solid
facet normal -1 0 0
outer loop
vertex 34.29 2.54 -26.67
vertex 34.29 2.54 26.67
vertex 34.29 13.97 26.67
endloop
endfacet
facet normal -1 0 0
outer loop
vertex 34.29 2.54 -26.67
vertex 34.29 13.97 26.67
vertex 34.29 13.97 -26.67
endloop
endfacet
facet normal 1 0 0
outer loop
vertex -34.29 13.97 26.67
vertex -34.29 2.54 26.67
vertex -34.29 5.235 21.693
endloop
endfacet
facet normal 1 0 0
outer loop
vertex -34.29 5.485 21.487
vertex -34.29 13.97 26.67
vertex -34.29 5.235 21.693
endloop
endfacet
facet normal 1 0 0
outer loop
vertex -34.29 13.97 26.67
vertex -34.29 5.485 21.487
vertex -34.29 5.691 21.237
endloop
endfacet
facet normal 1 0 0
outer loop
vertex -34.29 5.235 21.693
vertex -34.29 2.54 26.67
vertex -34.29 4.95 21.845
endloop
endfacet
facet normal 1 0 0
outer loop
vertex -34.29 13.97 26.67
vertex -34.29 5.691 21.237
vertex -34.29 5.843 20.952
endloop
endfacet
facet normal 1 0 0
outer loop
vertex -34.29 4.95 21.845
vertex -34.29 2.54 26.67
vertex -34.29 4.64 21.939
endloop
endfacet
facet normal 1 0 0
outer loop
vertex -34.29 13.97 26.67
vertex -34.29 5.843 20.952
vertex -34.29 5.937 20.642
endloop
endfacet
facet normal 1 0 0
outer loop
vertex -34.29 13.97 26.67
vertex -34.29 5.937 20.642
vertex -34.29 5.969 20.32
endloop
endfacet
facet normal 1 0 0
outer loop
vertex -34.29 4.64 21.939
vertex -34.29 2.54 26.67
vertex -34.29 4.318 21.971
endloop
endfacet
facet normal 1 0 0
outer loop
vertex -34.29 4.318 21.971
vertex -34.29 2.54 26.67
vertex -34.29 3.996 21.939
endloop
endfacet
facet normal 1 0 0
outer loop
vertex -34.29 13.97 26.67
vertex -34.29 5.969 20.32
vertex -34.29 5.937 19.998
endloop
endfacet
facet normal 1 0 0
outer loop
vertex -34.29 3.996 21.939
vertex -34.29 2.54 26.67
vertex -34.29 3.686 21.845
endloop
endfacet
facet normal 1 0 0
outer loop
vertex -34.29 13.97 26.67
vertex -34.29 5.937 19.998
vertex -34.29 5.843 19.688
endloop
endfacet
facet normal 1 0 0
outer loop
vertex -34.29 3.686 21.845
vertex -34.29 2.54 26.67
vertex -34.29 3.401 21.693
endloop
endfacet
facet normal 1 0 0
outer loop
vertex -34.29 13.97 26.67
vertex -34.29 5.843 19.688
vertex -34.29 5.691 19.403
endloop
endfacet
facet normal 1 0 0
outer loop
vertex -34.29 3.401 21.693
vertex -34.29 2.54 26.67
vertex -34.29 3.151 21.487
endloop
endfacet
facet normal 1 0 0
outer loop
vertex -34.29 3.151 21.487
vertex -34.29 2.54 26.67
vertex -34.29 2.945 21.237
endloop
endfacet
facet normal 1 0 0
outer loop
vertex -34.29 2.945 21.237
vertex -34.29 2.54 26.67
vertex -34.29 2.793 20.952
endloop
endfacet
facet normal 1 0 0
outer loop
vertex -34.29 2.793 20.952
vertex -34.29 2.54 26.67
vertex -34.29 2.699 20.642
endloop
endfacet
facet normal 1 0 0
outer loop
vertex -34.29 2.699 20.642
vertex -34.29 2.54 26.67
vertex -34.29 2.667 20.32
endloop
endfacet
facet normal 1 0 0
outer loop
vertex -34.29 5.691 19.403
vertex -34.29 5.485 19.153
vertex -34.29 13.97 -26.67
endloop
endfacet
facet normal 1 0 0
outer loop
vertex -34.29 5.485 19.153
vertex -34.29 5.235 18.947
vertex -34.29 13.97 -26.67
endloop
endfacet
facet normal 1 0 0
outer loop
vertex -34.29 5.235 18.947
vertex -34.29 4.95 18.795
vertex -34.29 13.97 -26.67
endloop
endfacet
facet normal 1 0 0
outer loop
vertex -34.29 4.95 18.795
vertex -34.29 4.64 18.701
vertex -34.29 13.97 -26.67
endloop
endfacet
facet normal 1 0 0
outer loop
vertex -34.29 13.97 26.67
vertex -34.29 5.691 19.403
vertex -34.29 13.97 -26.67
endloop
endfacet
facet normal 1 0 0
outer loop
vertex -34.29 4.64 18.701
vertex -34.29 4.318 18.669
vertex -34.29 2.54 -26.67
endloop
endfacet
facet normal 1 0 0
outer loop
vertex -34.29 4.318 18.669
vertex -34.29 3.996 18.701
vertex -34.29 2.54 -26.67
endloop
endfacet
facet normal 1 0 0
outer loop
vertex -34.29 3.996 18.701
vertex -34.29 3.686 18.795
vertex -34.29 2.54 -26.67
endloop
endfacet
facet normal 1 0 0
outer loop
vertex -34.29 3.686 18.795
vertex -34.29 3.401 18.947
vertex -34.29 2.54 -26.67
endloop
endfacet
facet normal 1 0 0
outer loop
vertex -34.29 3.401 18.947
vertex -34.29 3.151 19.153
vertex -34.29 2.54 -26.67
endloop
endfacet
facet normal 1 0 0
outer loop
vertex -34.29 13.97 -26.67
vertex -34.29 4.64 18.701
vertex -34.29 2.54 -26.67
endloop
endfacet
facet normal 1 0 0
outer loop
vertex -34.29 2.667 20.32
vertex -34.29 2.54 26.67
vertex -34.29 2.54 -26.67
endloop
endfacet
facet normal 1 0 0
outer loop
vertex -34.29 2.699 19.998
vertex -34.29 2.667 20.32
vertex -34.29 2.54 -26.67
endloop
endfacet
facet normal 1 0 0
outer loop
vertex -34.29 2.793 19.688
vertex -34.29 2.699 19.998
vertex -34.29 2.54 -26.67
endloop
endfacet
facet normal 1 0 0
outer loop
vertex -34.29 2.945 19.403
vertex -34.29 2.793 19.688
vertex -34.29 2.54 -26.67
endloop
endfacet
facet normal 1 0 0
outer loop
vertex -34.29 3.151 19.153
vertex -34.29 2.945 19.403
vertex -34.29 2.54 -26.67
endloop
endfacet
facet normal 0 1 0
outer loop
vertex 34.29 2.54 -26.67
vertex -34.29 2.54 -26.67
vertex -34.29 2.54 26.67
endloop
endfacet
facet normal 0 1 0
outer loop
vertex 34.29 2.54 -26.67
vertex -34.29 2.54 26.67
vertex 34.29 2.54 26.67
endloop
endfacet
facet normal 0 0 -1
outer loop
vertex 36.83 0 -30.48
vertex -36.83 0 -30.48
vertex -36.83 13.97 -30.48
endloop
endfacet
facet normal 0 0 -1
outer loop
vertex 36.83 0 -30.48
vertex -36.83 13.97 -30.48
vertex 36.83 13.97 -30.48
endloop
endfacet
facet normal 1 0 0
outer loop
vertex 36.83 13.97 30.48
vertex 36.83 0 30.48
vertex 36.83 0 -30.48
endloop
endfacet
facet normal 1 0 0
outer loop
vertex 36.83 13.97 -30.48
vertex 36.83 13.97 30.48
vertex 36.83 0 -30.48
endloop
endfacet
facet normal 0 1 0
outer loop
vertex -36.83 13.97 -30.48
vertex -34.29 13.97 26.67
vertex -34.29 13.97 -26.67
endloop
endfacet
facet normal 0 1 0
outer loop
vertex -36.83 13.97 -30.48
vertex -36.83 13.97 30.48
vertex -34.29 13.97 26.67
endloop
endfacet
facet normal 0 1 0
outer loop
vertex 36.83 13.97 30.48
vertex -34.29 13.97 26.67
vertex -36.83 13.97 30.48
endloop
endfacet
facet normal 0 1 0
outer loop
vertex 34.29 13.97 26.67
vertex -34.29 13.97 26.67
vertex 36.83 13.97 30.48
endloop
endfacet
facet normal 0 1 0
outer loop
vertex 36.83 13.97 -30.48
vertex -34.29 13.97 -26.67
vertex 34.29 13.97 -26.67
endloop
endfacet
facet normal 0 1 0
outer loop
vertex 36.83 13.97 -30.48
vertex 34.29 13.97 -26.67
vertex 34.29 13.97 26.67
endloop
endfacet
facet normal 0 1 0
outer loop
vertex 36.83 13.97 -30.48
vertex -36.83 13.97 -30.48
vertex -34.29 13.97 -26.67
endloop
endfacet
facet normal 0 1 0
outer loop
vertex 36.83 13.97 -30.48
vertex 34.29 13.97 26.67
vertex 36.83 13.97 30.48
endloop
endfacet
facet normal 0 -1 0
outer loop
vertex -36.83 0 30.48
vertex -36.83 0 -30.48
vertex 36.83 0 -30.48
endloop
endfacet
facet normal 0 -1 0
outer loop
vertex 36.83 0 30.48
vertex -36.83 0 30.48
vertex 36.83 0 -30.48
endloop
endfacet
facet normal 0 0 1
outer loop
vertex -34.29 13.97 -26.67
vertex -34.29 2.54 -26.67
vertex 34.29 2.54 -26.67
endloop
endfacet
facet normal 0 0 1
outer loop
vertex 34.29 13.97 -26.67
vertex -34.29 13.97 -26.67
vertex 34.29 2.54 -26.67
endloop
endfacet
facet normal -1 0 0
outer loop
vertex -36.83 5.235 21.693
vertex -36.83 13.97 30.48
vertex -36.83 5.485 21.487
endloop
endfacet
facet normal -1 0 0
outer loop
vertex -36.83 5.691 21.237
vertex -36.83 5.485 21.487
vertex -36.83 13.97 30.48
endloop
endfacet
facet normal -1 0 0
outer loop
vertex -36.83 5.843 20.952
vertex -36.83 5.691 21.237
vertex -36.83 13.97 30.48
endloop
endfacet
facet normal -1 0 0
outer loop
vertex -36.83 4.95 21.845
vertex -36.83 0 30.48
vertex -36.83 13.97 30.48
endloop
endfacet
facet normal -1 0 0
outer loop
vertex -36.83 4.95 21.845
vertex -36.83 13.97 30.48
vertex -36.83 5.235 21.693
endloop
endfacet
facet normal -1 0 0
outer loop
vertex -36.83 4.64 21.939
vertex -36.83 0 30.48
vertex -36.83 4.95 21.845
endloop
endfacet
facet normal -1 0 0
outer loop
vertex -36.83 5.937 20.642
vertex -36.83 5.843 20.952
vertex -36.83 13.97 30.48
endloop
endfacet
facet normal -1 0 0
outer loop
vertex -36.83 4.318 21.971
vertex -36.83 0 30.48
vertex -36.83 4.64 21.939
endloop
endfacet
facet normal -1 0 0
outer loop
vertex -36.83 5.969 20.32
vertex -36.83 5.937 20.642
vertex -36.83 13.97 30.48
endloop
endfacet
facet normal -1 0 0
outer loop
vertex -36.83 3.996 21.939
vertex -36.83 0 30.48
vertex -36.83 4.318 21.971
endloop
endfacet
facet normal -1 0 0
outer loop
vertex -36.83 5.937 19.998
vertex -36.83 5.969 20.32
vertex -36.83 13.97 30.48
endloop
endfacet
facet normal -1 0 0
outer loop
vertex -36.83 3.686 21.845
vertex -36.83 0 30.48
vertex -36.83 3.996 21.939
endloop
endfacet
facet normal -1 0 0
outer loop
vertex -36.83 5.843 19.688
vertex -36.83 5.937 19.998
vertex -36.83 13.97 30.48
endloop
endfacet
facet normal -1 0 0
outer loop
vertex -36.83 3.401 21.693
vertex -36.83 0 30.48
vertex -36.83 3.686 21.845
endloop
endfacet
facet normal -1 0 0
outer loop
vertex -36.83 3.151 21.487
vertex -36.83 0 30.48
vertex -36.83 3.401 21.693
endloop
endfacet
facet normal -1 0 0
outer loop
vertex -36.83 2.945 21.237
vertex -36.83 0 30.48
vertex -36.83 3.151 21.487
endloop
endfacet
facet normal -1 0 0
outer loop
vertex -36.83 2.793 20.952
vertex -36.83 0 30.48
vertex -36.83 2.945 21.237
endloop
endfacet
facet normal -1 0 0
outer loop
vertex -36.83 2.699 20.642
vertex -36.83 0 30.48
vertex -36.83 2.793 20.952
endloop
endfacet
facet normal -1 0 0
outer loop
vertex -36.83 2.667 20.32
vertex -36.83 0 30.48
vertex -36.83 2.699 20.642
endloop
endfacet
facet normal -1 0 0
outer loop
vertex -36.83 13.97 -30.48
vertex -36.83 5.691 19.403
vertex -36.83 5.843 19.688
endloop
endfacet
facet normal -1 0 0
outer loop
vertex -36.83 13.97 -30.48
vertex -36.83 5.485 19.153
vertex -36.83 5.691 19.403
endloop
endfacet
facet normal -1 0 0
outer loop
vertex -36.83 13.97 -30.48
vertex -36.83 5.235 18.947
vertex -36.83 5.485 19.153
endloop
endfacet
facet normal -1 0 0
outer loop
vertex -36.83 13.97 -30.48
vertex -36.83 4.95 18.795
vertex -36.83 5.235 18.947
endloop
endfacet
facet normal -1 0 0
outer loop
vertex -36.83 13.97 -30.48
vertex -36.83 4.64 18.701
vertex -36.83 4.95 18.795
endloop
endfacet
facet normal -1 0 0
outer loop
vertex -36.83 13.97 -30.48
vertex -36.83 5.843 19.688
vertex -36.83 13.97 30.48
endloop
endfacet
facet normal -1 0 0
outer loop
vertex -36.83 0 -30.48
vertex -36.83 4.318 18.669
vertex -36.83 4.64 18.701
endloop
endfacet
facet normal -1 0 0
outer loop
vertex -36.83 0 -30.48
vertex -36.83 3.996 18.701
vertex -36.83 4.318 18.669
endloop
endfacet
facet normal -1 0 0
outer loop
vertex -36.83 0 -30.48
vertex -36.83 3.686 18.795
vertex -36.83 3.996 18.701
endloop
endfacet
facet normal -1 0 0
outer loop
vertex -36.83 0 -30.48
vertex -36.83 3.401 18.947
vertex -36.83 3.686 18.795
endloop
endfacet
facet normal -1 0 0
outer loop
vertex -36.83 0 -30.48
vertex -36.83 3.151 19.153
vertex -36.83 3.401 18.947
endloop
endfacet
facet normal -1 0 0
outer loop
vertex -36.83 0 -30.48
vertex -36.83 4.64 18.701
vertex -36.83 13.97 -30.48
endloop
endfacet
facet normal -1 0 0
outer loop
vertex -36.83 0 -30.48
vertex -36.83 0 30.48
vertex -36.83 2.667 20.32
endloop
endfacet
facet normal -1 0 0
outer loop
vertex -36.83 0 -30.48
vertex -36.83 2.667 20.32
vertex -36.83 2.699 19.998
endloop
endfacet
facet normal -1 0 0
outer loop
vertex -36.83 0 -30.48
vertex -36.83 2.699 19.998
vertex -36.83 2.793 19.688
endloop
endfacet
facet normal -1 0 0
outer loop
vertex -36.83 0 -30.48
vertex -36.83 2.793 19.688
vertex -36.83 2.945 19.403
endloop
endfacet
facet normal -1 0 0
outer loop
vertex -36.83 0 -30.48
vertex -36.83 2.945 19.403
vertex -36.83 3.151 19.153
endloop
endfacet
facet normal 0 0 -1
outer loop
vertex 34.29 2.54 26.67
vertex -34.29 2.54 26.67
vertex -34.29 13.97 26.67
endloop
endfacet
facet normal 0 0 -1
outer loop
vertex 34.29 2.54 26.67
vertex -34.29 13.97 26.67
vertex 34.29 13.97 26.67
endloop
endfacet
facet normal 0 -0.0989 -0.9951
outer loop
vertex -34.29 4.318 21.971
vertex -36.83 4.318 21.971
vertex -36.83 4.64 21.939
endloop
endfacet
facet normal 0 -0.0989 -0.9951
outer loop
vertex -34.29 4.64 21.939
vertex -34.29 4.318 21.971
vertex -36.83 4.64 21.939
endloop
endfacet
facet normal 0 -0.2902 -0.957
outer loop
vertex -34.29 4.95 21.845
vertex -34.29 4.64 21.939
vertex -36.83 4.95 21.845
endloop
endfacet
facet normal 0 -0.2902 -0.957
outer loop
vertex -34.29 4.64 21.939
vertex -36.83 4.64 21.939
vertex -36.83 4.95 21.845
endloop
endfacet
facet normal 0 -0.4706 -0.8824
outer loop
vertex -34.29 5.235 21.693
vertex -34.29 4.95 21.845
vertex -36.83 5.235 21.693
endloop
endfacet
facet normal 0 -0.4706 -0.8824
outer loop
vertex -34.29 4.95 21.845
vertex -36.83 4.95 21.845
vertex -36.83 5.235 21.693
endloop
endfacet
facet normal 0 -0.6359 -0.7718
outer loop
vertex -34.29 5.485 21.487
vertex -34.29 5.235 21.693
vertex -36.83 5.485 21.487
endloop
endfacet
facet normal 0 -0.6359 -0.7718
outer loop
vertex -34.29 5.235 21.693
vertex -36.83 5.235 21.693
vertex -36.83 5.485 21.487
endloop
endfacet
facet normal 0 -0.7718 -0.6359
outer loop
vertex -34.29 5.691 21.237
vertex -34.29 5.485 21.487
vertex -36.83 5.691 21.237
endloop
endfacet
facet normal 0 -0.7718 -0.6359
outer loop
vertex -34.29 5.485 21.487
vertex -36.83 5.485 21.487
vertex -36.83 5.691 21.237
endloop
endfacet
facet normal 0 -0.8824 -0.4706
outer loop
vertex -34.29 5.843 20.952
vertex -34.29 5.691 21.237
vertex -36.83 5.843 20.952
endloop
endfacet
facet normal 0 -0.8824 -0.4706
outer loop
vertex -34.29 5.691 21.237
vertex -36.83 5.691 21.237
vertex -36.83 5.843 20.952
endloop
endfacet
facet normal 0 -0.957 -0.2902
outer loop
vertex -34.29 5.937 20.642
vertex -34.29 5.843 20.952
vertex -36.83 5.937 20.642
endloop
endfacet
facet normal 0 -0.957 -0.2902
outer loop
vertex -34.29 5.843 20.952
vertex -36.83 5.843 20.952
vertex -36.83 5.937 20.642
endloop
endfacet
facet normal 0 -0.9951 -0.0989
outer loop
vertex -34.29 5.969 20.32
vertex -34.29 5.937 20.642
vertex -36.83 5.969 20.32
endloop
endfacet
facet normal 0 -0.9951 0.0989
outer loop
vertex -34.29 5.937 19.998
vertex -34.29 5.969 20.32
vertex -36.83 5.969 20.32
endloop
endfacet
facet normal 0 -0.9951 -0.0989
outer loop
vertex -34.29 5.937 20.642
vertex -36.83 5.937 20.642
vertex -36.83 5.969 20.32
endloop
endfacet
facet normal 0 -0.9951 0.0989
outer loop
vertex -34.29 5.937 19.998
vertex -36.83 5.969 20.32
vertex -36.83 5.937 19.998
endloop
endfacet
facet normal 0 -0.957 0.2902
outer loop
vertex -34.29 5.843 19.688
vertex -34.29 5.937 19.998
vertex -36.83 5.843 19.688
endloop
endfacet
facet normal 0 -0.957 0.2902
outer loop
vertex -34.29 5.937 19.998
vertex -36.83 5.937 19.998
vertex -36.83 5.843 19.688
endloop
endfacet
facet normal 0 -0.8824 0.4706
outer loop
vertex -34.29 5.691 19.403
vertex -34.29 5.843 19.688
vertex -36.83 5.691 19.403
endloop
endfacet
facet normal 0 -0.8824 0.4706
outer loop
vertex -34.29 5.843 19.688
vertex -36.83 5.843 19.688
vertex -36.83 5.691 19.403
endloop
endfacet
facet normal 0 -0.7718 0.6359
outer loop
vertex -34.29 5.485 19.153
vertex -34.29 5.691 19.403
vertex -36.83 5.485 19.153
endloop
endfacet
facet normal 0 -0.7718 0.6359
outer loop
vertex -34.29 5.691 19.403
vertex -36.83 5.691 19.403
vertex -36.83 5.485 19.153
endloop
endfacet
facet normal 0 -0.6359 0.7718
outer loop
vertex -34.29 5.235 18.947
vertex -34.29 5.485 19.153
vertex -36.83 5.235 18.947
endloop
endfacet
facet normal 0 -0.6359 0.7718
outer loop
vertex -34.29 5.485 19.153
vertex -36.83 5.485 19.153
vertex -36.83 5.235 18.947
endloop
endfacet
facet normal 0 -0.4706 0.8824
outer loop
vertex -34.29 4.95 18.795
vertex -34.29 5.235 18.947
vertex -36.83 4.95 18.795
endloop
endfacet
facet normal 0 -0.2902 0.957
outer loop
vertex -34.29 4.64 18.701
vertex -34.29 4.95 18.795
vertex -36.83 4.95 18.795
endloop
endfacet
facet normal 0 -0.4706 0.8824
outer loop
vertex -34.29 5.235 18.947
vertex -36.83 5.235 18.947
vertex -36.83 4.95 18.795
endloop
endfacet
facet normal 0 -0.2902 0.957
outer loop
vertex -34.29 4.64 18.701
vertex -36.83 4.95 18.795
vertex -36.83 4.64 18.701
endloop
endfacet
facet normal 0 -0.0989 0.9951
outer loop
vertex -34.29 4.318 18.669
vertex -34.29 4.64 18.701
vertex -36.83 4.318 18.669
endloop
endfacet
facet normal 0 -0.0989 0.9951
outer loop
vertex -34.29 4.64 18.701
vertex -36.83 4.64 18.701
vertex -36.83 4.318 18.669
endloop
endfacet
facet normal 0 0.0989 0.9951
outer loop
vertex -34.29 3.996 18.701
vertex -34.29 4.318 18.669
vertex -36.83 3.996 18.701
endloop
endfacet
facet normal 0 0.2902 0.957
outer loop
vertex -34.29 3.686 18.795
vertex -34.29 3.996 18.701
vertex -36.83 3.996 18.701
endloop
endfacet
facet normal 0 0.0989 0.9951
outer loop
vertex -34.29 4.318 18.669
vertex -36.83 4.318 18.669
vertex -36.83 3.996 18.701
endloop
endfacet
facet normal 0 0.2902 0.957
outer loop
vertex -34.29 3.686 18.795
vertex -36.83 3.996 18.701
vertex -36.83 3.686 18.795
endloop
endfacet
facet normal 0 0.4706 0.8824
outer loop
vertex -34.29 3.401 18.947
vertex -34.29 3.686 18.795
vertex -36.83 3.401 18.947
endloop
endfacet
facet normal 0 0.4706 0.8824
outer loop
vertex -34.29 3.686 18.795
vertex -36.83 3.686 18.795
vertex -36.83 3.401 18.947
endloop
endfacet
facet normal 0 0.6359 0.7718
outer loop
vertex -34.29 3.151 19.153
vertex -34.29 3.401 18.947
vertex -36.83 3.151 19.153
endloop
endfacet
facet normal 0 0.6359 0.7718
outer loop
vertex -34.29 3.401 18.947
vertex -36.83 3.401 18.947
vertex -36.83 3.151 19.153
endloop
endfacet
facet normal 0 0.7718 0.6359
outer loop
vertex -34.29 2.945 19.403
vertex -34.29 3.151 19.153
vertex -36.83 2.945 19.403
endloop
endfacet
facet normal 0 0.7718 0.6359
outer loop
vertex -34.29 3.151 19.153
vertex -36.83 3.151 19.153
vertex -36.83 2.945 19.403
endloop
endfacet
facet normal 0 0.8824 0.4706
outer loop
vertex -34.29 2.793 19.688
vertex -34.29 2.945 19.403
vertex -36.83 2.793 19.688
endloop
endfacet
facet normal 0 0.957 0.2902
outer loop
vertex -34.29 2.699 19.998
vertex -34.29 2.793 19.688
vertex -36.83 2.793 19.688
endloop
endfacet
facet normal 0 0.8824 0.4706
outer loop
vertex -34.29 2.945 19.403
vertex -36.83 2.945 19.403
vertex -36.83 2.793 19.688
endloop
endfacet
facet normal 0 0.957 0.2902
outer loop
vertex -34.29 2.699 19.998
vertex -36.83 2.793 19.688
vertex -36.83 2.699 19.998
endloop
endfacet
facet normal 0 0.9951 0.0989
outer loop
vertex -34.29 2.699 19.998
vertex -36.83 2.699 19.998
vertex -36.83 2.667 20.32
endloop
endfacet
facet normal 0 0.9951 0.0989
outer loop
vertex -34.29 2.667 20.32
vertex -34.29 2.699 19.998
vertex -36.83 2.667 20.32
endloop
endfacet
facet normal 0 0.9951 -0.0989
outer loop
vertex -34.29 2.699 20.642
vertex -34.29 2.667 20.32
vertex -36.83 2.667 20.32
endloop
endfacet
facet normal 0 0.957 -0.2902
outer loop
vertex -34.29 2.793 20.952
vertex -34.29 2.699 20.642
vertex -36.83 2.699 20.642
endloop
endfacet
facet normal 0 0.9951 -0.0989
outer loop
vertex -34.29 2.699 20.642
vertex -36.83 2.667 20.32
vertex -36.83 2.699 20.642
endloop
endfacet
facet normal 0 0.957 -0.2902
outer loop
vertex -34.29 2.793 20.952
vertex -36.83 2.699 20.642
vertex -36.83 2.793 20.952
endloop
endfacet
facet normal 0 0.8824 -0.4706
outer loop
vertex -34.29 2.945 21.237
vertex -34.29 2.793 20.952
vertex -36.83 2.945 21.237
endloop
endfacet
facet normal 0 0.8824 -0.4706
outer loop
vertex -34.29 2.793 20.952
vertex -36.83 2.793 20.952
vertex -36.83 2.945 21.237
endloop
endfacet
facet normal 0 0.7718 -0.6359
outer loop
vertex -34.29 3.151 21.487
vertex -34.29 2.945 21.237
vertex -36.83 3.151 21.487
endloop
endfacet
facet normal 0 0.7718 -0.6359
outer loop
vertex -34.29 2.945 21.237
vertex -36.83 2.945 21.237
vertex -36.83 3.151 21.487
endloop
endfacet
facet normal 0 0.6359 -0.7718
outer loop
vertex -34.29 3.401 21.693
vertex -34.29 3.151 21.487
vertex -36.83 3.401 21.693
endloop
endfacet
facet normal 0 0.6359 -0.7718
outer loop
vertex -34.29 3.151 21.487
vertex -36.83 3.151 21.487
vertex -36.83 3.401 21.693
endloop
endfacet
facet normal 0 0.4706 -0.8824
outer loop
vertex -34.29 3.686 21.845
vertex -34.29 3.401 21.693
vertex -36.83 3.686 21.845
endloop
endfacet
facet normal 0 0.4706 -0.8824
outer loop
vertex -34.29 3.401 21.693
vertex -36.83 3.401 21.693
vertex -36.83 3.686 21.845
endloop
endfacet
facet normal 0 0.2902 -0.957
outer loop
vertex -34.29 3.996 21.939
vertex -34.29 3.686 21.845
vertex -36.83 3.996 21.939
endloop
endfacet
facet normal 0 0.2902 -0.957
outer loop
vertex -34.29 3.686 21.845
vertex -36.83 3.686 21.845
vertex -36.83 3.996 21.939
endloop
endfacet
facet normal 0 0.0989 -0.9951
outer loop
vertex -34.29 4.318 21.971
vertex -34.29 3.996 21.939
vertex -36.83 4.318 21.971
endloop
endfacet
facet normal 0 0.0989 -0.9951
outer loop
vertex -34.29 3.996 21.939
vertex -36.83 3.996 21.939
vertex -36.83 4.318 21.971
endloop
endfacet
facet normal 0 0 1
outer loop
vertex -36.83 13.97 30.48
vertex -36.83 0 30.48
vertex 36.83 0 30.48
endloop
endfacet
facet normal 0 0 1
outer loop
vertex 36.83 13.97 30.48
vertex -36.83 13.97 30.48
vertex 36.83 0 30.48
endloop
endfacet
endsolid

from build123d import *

# Parameters (mm, degrees)
SKETCH1_W         = 68.58
SKETCH1_H         = 53.34
PCB_BASE_DEPTH    = 2.54
SKETCH1_4_W       = 73.66
SKETCH1_4_H       = 60.96
SKETCH1_4_W_2     = 68.58
SKETCH1_4_H_2     = 53.34
PCB_WALL_DEPTH    = 13.97
SKETCH3_R         = 1.651
BATTERY_GAP_DEPTH = 2.54


with BuildPart() as part:
    # Sketch1 → pcb-base (new body)
    with BuildSketch(Plane(origin=(0, 0, 0), x_dir=(1, 0, 0), z_dir=(0, 1, 0))):
        Rectangle(SKETCH1_W, SKETCH1_H)
    extrude(amount=PCB_BASE_DEPTH)

    # Sketch1<4> → pcb-wall (add)
    with BuildSketch(Plane(origin=(0, 0, 0), x_dir=(1, 0, 0), z_dir=(0, 1, 0))):
        Rectangle(SKETCH1_4_W, SKETCH1_4_H)
        Rectangle(SKETCH1_4_W_2, SKETCH1_4_H_2, mode=Mode.SUBTRACT)
    extrude(amount=PCB_WALL_DEPTH)

    # Sketch3 → battery-gap (cut)
    with BuildSketch(Plane.ZY.offset(36.83)):
        with Locations((20.32, 4.318)):
            Circle(SKETCH3_R)
    extrude(amount=-BATTERY_GAP_DEPTH, mode=Mode.SUBTRACT)


solid = part.part
